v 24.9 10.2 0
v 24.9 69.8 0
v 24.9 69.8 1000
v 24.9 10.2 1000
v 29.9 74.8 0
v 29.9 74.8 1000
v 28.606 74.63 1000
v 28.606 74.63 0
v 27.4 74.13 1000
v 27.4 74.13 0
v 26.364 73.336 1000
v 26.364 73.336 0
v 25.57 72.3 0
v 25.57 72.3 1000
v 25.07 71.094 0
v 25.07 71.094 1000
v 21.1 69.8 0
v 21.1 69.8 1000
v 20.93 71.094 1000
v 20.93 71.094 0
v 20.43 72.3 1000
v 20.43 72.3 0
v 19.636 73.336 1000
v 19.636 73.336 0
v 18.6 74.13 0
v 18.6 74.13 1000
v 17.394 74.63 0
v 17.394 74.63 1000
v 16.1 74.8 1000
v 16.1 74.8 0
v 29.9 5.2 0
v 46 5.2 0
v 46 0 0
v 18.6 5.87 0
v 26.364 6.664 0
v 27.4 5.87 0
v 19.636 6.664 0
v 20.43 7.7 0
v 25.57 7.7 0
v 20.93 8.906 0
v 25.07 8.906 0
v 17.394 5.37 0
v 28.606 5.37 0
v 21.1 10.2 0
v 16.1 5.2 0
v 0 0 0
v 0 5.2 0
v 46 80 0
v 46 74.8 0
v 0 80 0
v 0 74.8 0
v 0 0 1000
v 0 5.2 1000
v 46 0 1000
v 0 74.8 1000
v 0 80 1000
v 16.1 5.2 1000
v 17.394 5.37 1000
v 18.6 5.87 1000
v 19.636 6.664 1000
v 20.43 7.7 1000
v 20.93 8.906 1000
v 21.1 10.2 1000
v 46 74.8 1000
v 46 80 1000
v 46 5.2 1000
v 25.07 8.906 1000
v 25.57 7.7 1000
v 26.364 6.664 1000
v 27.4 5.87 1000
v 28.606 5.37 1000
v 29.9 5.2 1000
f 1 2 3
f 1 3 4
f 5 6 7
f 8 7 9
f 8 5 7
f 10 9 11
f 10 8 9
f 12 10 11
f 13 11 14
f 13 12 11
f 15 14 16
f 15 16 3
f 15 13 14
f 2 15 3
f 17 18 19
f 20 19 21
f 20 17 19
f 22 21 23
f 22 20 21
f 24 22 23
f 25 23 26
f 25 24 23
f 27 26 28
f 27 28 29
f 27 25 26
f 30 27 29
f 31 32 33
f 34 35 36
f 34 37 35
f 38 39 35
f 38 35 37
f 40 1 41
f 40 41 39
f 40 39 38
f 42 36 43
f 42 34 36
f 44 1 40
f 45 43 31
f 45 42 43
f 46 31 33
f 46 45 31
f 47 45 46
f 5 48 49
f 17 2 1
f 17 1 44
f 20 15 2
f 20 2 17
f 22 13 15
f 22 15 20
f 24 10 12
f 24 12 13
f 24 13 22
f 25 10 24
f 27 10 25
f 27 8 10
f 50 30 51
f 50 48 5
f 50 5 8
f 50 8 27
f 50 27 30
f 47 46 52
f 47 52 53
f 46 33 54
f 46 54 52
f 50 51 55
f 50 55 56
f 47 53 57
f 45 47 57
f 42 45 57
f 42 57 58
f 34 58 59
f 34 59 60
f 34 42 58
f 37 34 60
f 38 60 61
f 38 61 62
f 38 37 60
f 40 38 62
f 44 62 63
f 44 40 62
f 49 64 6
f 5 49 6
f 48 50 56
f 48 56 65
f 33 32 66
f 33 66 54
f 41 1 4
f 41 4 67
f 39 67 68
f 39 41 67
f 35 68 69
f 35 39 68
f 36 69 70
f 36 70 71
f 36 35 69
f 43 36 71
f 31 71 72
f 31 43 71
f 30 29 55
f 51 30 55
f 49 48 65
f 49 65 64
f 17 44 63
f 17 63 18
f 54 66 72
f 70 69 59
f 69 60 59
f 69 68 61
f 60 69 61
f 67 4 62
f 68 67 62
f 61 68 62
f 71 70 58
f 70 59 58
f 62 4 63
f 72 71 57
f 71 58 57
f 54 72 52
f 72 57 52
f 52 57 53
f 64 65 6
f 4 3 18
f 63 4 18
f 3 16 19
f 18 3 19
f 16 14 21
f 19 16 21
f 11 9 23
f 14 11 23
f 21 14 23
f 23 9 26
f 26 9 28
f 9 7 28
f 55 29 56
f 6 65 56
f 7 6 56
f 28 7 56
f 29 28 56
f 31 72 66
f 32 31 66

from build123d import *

# Parameters (mm, degrees)
LINEAR_AUSTRAGEN1_DEPTH = 1000


with BuildPart() as part:
    # Skizze1 → Linear austragen1 (new body)
    with BuildSketch(Plane.XY):
        with BuildLine():
            Line((0, 0), (0, 5.2))
            Line((0, 5.2), (16.1, 5.2))
            ThreePointArc((16.1, 5.2), (19.635533906, 6.664466094), (21.1, 10.2))
            Line((21.1, 10.2), (21.1, 69.8))
            ThreePointArc((21.1, 69.8), (19.635533906, 73.335533906), (16.1, 74.8))
            Line((16.1, 74.8), (0, 74.8))
            Line((0, 74.8), (0, 80))
            Line((0, 80), (46, 80))
            Line((46, 80), (46, 74.8))
            Line((46, 74.8), (29.9, 74.8))
            ThreePointArc((29.9, 74.8), (26.364466094, 73.335533906), (24.9, 69.8))
            Line((24.9, 69.8), (24.9, 10.2))
            ThreePointArc((24.9, 10.2), (26.364466094, 6.664466094), (29.9, 5.2))
            Line((29.9, 5.2), (46, 5.2))
            Line((46, 5.2), (46, 0))
            Line((46, 0), (0, 0))
        make_face()
    extrude(amount=LINEAR_AUSTRAGEN1_DEPTH)


solid = part.part
